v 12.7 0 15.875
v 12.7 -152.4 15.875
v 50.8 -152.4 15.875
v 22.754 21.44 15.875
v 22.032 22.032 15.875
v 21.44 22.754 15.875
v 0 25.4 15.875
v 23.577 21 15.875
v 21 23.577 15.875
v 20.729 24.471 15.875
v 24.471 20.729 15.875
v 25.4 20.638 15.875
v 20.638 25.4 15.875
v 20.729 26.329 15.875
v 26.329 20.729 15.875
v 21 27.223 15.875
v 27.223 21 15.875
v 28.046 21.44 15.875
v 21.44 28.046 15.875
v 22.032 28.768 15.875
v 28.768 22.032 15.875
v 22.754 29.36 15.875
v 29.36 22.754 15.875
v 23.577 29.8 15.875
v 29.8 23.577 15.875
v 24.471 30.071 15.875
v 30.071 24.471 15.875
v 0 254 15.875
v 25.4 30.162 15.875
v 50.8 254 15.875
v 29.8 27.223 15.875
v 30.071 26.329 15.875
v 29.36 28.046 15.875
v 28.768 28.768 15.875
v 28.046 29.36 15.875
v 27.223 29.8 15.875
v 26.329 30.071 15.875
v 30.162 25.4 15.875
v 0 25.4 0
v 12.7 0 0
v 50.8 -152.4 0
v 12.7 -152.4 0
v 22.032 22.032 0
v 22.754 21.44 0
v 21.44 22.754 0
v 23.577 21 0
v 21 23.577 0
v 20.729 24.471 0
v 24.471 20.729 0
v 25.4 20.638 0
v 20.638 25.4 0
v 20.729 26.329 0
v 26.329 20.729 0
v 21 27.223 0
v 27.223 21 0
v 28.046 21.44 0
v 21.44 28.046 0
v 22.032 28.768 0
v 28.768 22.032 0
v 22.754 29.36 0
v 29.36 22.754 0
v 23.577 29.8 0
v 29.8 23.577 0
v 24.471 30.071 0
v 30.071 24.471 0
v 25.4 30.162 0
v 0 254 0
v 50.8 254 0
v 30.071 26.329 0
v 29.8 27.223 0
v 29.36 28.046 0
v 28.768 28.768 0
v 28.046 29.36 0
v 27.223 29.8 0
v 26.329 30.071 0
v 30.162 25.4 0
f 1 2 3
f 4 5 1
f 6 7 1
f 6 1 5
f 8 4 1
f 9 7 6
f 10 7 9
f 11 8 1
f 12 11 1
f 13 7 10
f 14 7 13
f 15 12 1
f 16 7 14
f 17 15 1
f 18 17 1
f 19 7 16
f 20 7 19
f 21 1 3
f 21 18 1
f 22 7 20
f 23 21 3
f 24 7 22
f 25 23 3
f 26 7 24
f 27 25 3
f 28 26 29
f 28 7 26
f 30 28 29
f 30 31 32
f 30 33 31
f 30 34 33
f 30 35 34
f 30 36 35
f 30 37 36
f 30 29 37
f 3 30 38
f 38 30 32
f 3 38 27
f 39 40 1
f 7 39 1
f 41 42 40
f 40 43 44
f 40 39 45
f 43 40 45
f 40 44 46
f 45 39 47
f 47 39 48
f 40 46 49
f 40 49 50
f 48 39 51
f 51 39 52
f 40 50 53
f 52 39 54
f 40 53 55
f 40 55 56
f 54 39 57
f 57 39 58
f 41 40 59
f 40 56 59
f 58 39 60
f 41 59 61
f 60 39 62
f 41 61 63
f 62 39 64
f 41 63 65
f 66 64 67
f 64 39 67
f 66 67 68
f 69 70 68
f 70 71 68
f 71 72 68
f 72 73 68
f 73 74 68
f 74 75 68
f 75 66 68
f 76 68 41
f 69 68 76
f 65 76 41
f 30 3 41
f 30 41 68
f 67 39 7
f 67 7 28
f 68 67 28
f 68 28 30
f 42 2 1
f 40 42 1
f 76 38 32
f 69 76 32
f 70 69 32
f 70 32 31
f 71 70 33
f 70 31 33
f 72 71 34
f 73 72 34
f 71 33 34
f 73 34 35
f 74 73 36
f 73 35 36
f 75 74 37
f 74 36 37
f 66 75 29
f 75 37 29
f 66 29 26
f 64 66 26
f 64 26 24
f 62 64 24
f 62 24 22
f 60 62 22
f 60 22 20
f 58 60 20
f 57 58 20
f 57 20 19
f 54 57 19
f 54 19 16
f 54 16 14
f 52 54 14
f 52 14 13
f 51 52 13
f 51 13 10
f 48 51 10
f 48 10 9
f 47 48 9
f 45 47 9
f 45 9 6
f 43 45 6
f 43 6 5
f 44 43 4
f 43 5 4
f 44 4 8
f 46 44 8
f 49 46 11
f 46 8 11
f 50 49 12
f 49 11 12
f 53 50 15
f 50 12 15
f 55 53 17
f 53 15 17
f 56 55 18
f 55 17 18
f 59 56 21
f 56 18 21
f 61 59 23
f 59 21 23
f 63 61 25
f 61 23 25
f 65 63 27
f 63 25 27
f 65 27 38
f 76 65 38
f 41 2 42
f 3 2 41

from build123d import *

# Parameters (mm, degrees)
SKETCH1_W           = 50.8
SKETCH1_H           = 254
BOSS_EXTRUDE1_DEPTH = 15.875
CHAMFER1_SIZE       = 25.4
CHAMFER1_SIZE2      = 12.7
SKETCH2_R           = 4.7625
CUT_EXTRUDE1_DEPTH  = 16.875
SKETCH3_W           = 38.1
SKETCH3_H           = 152.4
BOSS_EXTRUDE2_DEPTH = 15.875


with BuildPart() as part:
    # Sketch1 → Boss-Extrude1 (new body)
    with BuildSketch(Plane.XY):
        with Locations((25.4, 127)):
            Rectangle(SKETCH1_W, SKETCH1_H)
    extrude(amount=BOSS_EXTRUDE1_DEPTH)

    # Chamfer1
    chamfer1_edges = [part.edges().sort_by_distance(p)[0] for p in [
        (0, 0, 7.9375),
    ]]
    chamfer1_side = [part.faces().sort_by_distance(p)[0] for p in [
        (0, 127, 7.9375),
    ]]
    chamfer(chamfer1_edges, length=CHAMFER1_SIZE, length2=CHAMFER1_SIZE2, reference=chamfer1_side[0])

    # Sketch2 → Cut-Extrude1 (cut, through all)
    with BuildSketch(Plane.XY.offset(15.875)):
        with Locations((25.4, 25.4)):
            Circle(SKETCH2_R)
    extrude(amount=-CUT_EXTRUDE1_DEPTH, mode=Mode.SUBTRACT)

    # Sketch3 → Boss-Extrude2 (add)
    with BuildSketch(Plane.XY.offset(15.875)):
        with Locations((31.75, -76.2)):
            Rectangle(SKETCH3_W, SKETCH3_H)
    extrude(amount=-BOSS_EXTRUDE2_DEPTH)


solid = part.part
